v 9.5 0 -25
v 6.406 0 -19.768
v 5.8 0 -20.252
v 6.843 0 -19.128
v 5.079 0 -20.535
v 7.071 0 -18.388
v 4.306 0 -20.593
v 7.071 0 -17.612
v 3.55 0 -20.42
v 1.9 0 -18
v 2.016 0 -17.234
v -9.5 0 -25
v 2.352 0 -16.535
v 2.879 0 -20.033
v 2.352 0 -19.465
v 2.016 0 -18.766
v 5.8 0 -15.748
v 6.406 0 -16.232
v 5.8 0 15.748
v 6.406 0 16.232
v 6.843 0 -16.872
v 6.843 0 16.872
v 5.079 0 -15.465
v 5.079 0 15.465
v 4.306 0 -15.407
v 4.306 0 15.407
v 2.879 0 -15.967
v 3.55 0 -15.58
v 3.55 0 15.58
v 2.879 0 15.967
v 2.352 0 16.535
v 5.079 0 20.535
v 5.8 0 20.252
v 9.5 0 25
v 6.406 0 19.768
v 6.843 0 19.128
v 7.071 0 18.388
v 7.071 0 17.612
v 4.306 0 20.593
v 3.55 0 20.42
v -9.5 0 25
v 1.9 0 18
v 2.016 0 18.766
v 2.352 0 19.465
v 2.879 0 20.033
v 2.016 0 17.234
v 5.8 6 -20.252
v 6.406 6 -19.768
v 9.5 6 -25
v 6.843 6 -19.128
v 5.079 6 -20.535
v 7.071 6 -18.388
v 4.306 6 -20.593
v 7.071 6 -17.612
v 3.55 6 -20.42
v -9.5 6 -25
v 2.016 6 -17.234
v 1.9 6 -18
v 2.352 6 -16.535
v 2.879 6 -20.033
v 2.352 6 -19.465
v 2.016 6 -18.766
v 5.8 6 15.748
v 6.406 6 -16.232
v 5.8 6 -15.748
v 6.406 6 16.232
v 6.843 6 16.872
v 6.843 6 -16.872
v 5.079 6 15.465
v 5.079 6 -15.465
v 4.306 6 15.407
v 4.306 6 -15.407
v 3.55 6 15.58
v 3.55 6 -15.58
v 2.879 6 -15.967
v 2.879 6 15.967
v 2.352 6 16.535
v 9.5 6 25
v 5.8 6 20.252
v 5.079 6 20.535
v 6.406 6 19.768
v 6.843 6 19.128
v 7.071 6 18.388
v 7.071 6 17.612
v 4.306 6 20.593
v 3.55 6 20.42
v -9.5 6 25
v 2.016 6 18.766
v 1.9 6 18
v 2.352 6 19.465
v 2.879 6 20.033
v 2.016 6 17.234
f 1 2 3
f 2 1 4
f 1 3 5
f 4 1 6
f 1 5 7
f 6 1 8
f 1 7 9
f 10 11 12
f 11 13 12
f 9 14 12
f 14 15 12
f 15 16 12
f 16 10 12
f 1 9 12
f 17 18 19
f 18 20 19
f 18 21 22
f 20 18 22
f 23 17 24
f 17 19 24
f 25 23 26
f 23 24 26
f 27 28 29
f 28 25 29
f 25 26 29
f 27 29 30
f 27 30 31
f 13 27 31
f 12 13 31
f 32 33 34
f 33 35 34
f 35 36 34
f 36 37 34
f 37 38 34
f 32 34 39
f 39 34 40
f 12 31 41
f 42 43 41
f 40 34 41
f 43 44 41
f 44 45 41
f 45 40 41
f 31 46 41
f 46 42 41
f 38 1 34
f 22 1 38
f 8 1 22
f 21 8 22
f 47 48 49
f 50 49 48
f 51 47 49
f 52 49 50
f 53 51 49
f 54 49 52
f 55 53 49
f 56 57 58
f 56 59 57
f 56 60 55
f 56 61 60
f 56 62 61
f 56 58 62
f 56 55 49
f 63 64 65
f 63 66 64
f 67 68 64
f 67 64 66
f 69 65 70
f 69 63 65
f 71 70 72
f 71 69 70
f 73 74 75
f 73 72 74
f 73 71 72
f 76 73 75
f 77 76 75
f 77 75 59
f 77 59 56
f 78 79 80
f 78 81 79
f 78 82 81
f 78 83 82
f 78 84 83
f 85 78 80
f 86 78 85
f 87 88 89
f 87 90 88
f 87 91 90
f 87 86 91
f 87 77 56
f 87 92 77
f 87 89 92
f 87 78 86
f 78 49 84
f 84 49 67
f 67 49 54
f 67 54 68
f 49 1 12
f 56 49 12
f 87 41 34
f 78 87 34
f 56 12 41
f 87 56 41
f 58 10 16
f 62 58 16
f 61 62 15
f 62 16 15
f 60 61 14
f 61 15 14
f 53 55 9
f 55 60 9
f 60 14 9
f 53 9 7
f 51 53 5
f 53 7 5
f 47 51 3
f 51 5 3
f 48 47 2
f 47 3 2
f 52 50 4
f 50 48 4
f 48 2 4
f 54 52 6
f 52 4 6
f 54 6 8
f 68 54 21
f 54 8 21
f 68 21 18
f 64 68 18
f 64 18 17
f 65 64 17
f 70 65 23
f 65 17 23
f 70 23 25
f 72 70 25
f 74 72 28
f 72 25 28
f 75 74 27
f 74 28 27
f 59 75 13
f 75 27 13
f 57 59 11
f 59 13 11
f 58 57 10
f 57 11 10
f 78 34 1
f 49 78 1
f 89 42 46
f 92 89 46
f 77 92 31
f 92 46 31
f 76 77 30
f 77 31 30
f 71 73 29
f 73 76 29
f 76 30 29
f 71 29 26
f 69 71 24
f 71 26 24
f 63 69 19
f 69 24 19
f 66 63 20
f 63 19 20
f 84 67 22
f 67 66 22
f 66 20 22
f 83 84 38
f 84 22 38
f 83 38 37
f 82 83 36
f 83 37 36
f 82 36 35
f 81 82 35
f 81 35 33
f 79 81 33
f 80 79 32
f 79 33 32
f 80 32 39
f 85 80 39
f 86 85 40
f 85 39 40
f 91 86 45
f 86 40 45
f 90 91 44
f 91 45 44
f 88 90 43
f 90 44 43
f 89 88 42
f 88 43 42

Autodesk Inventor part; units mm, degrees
ref_plane "YZ Plane" through (0, 0, 0) normal (1, 0, 0) x (0, 1, 0)
ref_plane "XZ Plane" through (0, 0, 0) normal (0, 1, 0) x (-1, 0, 0)
ref_plane "XY Plane" through (0, 0, 0) normal (0, 0, 1) x (1, 0, 0)
sketch "Sketch1" plane through (0, 0, 0) normal (0, 1, 0) x (-1, 0, 0)
  line L0 (9.5, 25) -> (-9.5, 25)
  line L1 (-9.5, 25) -> (-9.5, -25)
  line L2 (-9.5, -25) -> (9.5, -25)
  line L3 (9.5, -25) -> (9.5, 25)
  line L4 (9.5, 25) -> (-9.5, -25) construction
  line L5 (-9.5, 25) -> (9.5, -25) construction
  circle A0 centre (-4.5, -18) radius 2.6
  circle A1 centre (-4.5, 18) radius 2.6
  point P0 (0, 0)
  dimension "d0" = 50
  dimension "d1" = 19
  dimension "d2" = 5.2
  dimension "d3" = 5.2
  dimension "d4" = 36
  dimension "d5" = 5
  dimension "d6" = 18
extrude "Extrusion1" add sketch "Sketch1" along normal blind 6
properties part number "Fuhrungschiene(n)"
